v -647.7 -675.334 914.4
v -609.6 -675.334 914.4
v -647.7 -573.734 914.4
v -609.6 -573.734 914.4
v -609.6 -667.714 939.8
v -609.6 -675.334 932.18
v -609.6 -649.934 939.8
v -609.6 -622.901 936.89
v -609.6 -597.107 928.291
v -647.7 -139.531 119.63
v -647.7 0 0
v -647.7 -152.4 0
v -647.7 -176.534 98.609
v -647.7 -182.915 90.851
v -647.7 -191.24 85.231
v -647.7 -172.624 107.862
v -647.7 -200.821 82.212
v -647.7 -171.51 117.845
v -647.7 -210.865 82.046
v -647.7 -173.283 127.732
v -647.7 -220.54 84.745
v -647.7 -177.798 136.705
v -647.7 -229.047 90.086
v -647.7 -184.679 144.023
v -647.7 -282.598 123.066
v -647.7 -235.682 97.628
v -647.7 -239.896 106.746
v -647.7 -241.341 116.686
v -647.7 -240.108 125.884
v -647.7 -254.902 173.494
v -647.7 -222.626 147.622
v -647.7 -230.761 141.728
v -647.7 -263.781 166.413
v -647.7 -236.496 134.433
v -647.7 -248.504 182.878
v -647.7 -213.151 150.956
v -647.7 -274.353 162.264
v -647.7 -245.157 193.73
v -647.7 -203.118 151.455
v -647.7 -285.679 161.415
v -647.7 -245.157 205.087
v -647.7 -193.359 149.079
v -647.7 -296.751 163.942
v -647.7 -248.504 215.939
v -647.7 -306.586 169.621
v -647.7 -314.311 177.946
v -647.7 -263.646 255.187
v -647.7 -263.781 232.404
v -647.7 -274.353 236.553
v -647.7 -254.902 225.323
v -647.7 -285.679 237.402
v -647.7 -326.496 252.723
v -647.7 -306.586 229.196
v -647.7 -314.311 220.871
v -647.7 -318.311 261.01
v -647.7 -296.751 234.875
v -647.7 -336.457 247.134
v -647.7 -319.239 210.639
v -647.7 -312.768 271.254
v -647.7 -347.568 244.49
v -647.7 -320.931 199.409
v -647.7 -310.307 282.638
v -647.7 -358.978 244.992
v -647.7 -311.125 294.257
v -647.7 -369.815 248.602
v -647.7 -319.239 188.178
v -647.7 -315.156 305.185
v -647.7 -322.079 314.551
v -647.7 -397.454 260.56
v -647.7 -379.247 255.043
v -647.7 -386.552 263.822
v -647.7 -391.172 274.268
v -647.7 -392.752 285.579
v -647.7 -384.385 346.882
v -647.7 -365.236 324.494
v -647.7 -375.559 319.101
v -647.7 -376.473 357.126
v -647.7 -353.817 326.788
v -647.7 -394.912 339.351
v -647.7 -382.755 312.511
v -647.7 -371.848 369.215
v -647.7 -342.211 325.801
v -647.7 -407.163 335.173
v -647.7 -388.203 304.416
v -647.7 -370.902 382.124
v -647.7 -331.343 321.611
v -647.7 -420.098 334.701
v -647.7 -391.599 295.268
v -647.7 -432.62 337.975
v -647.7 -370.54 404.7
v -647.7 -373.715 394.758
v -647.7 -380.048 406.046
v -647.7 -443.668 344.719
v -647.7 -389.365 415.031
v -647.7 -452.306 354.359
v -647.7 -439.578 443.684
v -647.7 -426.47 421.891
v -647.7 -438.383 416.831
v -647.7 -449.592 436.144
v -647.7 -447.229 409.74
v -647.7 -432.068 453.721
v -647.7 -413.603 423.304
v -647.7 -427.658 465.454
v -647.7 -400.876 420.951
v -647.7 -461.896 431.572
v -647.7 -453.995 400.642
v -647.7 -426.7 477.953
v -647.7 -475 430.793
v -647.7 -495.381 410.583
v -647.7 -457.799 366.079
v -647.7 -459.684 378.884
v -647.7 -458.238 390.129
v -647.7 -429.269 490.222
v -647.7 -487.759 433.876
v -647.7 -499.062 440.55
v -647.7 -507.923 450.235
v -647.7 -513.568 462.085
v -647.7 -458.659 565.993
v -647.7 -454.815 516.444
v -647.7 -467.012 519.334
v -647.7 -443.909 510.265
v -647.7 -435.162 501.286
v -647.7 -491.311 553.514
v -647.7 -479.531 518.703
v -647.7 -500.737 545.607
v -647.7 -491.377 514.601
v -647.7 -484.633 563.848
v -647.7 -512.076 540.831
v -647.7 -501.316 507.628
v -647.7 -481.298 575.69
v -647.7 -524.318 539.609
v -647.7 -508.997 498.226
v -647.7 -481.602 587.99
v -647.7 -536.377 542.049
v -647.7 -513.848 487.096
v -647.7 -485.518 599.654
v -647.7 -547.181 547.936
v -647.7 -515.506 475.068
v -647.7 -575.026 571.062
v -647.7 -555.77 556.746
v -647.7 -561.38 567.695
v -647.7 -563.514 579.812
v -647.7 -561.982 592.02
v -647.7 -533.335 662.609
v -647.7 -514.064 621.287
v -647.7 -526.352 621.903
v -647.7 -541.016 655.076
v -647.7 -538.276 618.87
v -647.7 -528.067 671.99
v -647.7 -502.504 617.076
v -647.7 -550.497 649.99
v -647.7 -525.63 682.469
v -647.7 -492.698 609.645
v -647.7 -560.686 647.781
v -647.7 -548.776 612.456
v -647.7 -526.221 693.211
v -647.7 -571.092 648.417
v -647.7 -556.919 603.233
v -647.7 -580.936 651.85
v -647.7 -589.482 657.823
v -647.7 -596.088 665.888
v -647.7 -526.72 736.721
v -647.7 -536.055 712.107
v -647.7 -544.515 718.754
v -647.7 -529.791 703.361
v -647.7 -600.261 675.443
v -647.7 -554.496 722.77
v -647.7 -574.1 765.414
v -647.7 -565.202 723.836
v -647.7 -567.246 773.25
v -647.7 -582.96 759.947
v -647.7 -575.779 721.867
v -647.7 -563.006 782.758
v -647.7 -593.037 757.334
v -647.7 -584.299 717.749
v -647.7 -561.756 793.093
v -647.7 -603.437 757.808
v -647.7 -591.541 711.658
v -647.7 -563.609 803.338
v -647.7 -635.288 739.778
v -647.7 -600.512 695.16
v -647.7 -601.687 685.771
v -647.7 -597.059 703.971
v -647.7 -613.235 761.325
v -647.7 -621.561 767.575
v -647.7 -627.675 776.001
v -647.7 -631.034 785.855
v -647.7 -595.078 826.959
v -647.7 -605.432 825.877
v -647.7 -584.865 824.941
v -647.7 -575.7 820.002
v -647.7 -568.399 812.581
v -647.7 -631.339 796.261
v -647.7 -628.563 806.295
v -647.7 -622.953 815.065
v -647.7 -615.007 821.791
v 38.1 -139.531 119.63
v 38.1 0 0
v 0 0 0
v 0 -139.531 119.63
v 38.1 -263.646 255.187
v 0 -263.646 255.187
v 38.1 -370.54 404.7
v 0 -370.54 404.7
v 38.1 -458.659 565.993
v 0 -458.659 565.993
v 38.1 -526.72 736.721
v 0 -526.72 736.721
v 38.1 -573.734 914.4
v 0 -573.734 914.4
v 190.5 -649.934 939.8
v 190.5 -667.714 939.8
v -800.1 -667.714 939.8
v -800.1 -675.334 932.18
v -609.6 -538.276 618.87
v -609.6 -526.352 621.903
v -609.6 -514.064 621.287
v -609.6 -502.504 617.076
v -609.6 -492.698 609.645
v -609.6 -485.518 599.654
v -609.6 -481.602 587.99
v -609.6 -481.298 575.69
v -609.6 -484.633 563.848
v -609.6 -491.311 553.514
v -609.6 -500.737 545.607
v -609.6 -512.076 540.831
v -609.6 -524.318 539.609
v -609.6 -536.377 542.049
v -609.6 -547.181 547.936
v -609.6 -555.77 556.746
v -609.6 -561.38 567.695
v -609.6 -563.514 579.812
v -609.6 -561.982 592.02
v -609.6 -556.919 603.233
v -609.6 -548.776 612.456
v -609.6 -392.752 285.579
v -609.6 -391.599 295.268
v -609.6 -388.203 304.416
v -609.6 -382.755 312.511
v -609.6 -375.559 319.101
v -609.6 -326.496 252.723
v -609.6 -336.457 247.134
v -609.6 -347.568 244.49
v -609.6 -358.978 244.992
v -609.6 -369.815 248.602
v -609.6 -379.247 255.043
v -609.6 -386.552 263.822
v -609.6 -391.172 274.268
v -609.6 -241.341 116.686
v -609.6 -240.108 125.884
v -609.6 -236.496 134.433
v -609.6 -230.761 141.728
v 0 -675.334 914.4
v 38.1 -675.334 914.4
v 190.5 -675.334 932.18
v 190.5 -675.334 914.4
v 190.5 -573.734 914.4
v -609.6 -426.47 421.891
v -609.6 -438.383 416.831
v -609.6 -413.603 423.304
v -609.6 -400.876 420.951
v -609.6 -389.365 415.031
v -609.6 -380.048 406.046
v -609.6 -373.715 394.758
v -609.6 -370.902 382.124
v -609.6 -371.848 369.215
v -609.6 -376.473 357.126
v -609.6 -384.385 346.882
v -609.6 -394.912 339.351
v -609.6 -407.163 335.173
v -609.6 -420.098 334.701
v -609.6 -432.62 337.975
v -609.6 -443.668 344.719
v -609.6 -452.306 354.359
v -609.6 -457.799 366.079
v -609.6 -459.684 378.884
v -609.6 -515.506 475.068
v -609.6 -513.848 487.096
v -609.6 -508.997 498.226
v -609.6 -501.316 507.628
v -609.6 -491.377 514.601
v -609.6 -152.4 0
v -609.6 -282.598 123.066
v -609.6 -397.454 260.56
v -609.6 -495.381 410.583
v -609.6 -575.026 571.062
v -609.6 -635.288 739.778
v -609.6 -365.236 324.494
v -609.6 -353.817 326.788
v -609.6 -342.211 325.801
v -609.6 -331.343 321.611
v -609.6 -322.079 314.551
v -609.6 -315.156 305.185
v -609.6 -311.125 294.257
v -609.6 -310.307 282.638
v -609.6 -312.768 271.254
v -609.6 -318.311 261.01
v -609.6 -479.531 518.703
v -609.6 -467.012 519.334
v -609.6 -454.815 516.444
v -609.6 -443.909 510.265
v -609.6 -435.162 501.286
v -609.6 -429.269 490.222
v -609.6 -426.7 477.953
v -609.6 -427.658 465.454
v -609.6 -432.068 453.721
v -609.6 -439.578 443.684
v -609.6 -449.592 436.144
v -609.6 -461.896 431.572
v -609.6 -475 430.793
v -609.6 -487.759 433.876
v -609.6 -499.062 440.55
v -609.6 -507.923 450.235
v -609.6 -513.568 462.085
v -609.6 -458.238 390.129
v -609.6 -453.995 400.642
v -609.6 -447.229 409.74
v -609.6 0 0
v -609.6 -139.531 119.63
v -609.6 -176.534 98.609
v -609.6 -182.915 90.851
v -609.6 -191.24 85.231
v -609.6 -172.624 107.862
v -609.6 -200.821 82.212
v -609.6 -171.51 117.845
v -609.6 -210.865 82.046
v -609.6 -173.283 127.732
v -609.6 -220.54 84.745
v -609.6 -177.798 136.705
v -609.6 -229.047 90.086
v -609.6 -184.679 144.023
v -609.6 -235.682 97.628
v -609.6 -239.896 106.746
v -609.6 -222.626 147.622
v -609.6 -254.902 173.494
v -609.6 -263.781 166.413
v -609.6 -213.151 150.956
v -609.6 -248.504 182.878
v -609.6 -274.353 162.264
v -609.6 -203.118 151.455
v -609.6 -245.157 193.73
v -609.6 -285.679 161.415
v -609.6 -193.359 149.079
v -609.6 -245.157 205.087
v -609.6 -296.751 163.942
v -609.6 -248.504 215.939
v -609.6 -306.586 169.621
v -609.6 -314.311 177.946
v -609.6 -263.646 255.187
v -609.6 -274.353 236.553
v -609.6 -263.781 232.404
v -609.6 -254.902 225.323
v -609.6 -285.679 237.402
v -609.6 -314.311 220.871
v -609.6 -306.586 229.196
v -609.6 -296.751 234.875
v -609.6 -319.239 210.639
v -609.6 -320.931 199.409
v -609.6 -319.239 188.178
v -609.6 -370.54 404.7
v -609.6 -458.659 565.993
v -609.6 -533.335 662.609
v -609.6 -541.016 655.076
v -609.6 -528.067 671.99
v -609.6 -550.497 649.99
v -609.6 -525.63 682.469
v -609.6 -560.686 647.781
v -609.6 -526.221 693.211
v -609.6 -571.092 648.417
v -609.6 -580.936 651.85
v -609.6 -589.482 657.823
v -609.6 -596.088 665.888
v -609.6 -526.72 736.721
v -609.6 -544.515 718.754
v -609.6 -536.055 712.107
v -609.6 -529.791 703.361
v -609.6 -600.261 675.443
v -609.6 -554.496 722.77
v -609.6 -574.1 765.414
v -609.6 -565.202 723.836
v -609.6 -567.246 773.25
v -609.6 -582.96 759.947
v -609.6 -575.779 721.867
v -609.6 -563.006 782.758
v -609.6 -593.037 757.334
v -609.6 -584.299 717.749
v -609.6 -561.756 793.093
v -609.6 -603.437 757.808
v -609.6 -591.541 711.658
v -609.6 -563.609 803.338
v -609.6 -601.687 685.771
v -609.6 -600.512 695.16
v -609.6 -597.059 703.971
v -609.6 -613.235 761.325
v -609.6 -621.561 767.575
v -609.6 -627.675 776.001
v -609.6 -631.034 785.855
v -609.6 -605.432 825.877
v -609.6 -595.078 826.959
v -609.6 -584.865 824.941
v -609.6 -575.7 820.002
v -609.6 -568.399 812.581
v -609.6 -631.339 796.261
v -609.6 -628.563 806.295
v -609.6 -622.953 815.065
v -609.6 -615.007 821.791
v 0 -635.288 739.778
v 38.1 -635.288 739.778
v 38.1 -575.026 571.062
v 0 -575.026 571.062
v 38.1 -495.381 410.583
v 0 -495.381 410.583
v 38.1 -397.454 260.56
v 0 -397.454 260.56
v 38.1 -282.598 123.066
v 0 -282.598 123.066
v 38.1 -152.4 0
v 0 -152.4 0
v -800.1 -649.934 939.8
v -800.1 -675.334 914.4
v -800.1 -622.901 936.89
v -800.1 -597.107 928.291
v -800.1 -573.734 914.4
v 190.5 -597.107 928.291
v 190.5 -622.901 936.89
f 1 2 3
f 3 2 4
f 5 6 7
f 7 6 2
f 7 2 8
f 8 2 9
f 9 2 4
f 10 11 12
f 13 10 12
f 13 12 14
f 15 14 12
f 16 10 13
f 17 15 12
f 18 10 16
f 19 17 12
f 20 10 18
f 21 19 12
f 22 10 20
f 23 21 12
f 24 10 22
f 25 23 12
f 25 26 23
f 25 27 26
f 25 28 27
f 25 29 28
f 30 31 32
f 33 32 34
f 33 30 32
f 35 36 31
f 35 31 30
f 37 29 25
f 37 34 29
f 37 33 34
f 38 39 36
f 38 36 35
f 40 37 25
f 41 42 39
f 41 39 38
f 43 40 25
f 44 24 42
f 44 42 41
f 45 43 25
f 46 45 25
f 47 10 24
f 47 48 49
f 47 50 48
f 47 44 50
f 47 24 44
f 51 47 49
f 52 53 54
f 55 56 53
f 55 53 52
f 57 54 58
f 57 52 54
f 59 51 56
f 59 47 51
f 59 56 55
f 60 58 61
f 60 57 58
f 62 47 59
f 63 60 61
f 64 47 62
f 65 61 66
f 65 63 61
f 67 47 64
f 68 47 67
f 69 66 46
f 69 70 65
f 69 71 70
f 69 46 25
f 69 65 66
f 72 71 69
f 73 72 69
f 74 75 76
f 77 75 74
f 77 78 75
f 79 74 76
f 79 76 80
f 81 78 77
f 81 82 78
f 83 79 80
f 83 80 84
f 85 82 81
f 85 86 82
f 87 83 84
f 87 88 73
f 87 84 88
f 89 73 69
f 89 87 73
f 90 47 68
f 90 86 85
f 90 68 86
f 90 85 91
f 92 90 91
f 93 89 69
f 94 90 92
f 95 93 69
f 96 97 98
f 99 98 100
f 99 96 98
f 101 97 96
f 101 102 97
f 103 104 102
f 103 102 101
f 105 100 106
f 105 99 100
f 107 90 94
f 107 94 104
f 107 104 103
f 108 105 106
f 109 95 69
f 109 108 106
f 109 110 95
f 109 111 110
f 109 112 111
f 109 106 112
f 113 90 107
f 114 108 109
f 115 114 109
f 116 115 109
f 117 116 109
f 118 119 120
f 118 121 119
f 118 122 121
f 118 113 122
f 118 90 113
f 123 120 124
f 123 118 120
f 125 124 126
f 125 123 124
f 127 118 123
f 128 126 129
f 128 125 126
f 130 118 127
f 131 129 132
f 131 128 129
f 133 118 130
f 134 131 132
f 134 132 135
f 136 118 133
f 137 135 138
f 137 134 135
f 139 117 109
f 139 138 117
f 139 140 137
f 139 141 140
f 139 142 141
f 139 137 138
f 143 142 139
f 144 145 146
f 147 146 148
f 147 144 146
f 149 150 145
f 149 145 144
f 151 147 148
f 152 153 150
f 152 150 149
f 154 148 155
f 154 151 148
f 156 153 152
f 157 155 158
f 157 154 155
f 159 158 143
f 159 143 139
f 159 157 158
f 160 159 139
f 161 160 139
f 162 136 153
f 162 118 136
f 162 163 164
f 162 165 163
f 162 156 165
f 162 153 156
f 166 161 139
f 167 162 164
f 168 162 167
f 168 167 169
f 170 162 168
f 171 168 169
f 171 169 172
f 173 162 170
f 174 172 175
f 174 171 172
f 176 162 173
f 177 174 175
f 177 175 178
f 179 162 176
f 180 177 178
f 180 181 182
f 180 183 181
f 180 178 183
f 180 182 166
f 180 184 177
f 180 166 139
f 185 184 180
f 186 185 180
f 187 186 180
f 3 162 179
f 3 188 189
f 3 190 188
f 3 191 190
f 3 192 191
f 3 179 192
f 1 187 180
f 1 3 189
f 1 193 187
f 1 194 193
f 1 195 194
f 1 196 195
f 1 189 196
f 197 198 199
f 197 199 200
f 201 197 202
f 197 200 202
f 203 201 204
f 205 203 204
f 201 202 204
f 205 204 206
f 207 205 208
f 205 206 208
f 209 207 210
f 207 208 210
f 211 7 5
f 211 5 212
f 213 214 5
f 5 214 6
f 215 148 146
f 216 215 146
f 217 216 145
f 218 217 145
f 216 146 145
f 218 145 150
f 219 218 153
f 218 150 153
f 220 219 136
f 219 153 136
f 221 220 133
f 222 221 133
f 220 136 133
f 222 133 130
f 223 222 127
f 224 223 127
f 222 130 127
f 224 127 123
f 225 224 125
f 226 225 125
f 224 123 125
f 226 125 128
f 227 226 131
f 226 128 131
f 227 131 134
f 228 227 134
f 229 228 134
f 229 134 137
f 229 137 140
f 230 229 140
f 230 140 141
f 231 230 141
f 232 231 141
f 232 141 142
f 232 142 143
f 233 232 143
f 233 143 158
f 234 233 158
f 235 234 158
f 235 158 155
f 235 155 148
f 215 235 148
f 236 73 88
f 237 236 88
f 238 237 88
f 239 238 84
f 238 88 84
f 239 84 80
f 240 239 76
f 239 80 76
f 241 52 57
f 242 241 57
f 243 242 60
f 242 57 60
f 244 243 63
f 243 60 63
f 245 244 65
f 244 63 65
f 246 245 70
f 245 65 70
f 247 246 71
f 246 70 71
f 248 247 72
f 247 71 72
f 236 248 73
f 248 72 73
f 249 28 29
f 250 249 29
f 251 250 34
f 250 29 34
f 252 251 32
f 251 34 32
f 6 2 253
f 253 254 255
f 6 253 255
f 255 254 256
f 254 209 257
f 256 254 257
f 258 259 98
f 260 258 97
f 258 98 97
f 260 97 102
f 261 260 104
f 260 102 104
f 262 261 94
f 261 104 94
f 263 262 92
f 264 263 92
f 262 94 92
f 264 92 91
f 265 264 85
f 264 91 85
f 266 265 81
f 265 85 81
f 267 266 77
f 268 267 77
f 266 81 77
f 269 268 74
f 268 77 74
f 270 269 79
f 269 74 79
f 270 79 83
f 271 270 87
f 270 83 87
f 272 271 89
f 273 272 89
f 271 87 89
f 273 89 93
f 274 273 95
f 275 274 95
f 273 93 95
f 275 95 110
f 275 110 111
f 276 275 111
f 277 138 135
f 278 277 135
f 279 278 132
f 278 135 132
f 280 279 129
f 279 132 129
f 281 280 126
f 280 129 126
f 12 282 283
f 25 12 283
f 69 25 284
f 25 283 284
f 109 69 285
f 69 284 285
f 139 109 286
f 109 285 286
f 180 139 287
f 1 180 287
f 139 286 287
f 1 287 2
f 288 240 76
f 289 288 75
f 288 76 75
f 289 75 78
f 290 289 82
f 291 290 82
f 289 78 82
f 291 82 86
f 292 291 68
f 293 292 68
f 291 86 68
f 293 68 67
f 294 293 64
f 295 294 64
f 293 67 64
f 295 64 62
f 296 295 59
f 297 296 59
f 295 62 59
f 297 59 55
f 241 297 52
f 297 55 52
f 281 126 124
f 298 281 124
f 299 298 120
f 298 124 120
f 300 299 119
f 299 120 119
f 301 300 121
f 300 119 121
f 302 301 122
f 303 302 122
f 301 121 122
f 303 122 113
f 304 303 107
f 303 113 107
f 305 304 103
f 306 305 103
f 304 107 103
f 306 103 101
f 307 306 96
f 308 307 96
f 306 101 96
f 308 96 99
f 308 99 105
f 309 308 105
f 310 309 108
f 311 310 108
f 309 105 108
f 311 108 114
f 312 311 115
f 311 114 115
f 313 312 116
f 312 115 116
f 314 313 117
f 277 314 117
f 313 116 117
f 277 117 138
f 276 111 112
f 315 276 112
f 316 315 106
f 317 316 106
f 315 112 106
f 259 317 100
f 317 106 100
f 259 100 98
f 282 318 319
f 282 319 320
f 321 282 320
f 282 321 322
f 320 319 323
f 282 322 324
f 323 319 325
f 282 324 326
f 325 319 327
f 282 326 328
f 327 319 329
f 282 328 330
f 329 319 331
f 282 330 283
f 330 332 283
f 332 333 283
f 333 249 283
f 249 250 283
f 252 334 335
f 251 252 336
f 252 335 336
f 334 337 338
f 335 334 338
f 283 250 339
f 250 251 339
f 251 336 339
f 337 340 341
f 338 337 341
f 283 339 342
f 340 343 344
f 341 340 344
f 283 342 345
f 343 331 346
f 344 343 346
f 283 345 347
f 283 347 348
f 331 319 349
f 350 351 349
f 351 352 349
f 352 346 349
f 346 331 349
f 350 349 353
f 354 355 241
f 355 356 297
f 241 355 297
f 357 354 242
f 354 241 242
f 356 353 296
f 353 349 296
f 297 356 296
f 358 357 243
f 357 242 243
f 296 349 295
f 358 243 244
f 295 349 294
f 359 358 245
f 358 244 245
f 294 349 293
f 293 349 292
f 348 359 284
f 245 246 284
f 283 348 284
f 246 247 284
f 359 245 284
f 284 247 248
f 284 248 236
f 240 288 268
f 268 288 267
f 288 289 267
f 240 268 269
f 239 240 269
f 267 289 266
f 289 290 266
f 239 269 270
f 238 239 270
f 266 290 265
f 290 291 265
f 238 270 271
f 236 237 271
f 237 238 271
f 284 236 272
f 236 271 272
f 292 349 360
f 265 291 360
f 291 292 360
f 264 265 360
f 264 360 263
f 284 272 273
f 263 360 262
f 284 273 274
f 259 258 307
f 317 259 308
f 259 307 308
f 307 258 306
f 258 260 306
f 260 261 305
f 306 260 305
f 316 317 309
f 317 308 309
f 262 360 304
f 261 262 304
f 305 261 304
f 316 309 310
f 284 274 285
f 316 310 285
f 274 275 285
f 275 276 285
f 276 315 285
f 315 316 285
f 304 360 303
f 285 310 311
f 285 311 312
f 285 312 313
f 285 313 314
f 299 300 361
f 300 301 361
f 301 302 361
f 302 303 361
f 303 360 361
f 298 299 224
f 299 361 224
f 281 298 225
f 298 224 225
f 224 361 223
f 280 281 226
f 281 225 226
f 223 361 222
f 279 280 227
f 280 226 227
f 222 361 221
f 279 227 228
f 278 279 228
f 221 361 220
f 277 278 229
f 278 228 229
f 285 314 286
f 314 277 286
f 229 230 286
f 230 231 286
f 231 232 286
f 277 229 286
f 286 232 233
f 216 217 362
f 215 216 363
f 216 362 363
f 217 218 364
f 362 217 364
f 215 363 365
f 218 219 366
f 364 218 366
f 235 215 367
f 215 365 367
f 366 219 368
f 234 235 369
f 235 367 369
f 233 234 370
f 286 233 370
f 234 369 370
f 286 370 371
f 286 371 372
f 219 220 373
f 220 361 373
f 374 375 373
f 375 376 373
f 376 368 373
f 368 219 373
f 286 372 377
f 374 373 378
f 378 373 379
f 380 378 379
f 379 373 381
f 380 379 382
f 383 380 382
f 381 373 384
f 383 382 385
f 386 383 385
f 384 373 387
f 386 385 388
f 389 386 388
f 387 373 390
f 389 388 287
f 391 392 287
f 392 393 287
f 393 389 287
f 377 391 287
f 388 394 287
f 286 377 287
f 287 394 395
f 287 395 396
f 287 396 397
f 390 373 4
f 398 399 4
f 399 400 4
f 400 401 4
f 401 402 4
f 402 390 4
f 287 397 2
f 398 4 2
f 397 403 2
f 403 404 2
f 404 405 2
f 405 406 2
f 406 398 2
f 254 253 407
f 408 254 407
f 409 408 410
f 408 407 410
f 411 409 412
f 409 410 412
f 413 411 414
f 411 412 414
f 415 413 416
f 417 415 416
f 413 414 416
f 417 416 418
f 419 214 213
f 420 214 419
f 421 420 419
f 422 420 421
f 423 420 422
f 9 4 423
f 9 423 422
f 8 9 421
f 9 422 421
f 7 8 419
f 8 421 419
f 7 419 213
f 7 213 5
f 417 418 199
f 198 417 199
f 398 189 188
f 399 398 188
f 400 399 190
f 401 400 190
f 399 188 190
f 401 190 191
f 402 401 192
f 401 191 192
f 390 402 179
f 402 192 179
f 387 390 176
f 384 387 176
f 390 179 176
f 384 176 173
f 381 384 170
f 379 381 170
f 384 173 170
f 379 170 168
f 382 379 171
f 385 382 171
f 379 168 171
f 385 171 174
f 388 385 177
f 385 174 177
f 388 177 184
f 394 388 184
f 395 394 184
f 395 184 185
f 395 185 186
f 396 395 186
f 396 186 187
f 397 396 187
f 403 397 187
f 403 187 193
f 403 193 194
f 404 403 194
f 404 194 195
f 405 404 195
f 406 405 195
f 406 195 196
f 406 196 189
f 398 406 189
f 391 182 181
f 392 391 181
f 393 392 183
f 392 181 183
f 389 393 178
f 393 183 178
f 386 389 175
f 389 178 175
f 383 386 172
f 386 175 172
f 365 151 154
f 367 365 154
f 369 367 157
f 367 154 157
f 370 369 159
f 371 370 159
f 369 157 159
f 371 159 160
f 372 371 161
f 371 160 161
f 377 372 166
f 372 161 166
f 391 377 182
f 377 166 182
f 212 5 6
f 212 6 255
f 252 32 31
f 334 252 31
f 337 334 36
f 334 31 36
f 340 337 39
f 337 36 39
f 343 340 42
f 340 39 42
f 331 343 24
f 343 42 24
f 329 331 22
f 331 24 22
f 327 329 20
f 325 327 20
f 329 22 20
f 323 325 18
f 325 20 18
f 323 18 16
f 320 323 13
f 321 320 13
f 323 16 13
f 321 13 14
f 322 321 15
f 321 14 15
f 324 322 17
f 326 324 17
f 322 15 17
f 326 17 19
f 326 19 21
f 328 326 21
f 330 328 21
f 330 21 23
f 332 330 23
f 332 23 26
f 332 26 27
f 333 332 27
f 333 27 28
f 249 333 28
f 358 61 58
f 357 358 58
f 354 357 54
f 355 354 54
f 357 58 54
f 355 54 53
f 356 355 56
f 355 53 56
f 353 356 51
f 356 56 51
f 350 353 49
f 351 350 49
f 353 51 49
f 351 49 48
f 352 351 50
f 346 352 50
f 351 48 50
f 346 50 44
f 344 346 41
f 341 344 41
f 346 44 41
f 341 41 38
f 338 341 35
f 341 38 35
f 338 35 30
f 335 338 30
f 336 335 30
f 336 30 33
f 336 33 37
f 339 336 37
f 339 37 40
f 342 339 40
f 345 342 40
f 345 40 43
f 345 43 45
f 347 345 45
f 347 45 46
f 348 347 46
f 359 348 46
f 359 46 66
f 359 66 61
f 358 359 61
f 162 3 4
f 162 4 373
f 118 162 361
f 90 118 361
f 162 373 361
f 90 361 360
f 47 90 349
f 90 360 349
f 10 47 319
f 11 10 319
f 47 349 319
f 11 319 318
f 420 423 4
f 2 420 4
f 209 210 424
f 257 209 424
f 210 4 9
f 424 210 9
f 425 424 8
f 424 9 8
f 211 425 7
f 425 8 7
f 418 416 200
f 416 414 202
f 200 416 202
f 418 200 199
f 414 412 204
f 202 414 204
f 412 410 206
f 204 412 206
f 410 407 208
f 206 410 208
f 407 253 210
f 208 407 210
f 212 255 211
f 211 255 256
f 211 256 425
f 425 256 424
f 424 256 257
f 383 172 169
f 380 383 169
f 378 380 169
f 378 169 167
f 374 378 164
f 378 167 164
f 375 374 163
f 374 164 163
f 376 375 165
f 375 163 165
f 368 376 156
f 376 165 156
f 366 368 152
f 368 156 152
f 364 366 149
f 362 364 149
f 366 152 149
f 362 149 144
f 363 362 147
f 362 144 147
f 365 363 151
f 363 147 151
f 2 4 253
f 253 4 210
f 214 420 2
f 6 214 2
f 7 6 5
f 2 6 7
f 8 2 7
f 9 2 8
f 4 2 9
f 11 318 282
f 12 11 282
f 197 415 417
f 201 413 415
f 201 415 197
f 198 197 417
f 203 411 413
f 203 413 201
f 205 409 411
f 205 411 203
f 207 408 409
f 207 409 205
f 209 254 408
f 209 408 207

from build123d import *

# Parameters (mm, degrees)
F1_DEPTH      = 38.1
F2_W          = 609.6
F2_H          = 101.6
F2_W_2        = 152.4
F2_W_3        = 38.1
F3_DEPTH      = 25.4
F5_DEPTH      = 38.1
F6_W          = 152.4
F6_H          = 101.6
F6_W_2        = 38.1
F7_DEPTH      = 25.4
F8_T1_DEPTH   = 342.8999998581
F8_T3_DEPTH   = 38.0999997161
F8_T5_DEPTH   = 800.1000004258
F8_2_T1_DEPTH = 571.5
F9_SIZE       = 7.62
F9_2_SIZE     = 7.62
F11_DEPTH     = 762


# Not quite as in the source:
# - a fillet or chamfer that OpenCascade refuses, or shapes differently, is made with other operations: its cross-section is extruded or revolved along the edge and cut away or added


with BuildPart() as f1:
    # F0 (on Right) → F1 (new body)
    with BuildSketch(Plane.YZ):
        with BuildLine():
            Line((-152.4, 0), (0, 0))
            ThreePointArc((0, 0), (-370.5404323347, 404.6996785445), (-573.7339955129, 914.4))
            Line((-573.7339955129, 914.4), (-675.3339955129, 914.4))
            ThreePointArc((-675.3339955129, 914.4), (-495.3809833516, 410.5831647228), (-152.4, 0))
        make_face()
    extrude(amount=F1_DEPTH)

    # F2 (on face) → F3 (join)
    with BuildSketch(Plane.XY.offset(914.4)):
        with Locations((-304.8, -624.5339955129)):
            Rectangle(F2_W, F2_H)
        with Locations((114.3, -624.5339955129)):
            Rectangle(F2_W_2, F2_H)
        with Locations((19.05, -624.5339955129)):
            Rectangle(F2_W_3, F2_H)
    extrude(amount=F3_DEPTH)

    # F8: fillet of radius 127 on 1 edges, made by hand

    # F8_s2 → F8_t1 (cut)
    with BuildSketch(Plane.YZ.offset(38.1000001419)):
        with BuildLine():
            ThreePointArc((-573.7339955129, 914.4), (-609.7730692288, 933.2827788524), (-649.9339955129, 939.8))
            Line((-649.9339955129, 939.8), (-573.7339955129, 939.8))
            Line((-573.7339955129, 939.8), (-573.7339955129, 914.4))
        make_face()
    extrude(amount=F8_T1_DEPTH, mode=Mode.SUBTRACT)

    # F8_s4 → F8_t3 (cut)
    with BuildSketch(Plane.YZ.offset(4.258e-07)):
        with BuildLine():
            ThreePointArc((-573.7339955129, 914.4), (-609.7730692288, 933.2827788524), (-649.9339955129, 939.8))
            Line((-649.9339955129, 939.8), (-573.7339955129, 939.8))
            Line((-573.7339955129, 939.8), (-573.7339955129, 914.4))
        make_face()
    extrude(amount=F8_T3_DEPTH, mode=Mode.SUBTRACT)

    # F8_s6 → F8_t5 (cut)
    with BuildSketch(Plane.YZ.offset(-800.1)):
        with BuildLine():
            ThreePointArc((-573.7339955129, 914.4), (-609.7730692288, 933.2827788524), (-649.9339955129, 939.8))
            Line((-649.9339955129, 939.8), (-573.7339955129, 939.8))
            Line((-573.7339955129, 939.8), (-573.7339955129, 914.4))
        make_face()
    extrude(amount=F8_T5_DEPTH, mode=Mode.SUBTRACT)

    # F9
    f9_edges = [f1.edges().sort_by_distance(p)[0] for p in [
        (-209.55, -675.333996, 939.8),
    ]]
    chamfer(f9_edges, length=F9_SIZE)


with BuildPart() as f5:
    # F4 (on face) → F5 (new body)
    with BuildSketch(Plane(origin=(-609.6, 0, 0), x_dir=(0, -1, 0), z_dir=(-1, 0, 0))):
        with BuildLine():
            Line((675.3339955129, 914.4), (573.7339955129, 914.4))
            ThreePointArc((573.7339955129, 914.4), (370.5404323347, 404.6996785445), (0, 0))
            Line((0, 0), (152.4, 0))
            ThreePointArc((152.4, 0), (495.3809833516, 410.5831647228), (675.3339955129, 914.4))
        make_face()
    extrude(amount=F5_DEPTH)

    # F10 (on face) → F11 (cut)
    with BuildSketch(Plane(origin=(-647.7, 0, 0), x_dir=(0, -1, 0), z_dir=(-1, 0, 0))):
        with BuildLine():
            ThreePointArc((631.5913753294, 792.0699234096), (624.2879152452, 813.4429474745), (605.4321107523, 825.876986392))
            ThreePointArc((605.4321107523, 825.876986392), (596.6663753294, 792.0699234096), (587.1282473408, 758.472605965))
            ThreePointArc((587.1282473408, 758.472605965), (617.7214994682, 764.2052975822), (631.5913753294, 792.0699234096))
        make_face()
        with BuildLine():
            ThreePointArc((587.1282473408, 758.472605965), (596.6663753294, 792.0699234096), (605.4321107523, 825.876986392))
            ThreePointArc((605.4321107523, 825.876986392), (562.9619724604, 801.2224559686), (587.1282473408, 758.472605965))
        make_face()
        with BuildLine():
            ThreePointArc((550.4966543465, 649.9899449451), (563.5869997391, 685.7705662017), (575.778808754, 721.8672390808))
            ThreePointArc((575.778808754, 721.8672390808), (527.6455446354, 698.4126311054), (550.4966543465, 649.9899449451))
        make_face()
        with BuildLine():
            ThreePointArc((601.6869997391, 685.7705662017), (594.5395272891, 707.986574805), (575.778808754, 721.8672390808))
            ThreePointArc((575.778808754, 721.8672390808), (563.5869997391, 685.7705662017), (550.4966543465, 649.9899449451))
            ThreePointArc((550.4966543465, 649.9899449451), (585.4143660546, 654.5427568048), (601.6869997391, 685.7705662017))
        make_face()
        with BuildLine():
            ThreePointArc((563.5267279961, 580.8319471591), (556.6393542578, 603.6599296605), (538.2757632433, 618.869506484))
            ThreePointArc((538.2757632433, 618.869506484), (522.2517279961, 580.8319471591), (505.2034801813, 543.2422827359))
            ThreePointArc((505.2034801813, 543.2422827359), (544.6119515689, 546.1383450576), (563.5267279961, 580.8319471591))
        make_face()
        with BuildLine():
            ThreePointArc((505.2034801813, 543.2422827359), (522.2517279961, 580.8319471591), (538.2757632433, 618.869506484))
            ThreePointArc((538.2757632433, 618.869506484), (484.4346485768, 597.3696050705), (505.2034801813, 543.2422827359))
        make_face()
        with BuildLine():
            ThreePointArc((491.3765799038, 514.6013703621), (471.0563792428, 475.0679421639), (449.5918860193, 436.1439388927))
            ThreePointArc((449.5918860193, 436.1439388927), (493.658434196, 436.793281984), (515.5063792428, 475.0679421639))
            ThreePointArc((515.5063792428, 475.0679421639), (508.9973558998, 498.2257656867), (491.3765799038, 514.6013703621))
        make_face()
        with BuildLine():
            ThreePointArc((491.3765799038, 514.6013703621), (431.8234913863, 495.962511086), (449.5918860193, 436.1439388927))
            ThreePointArc((449.5918860193, 436.1439388927), (471.0563792428, 475.0679421639), (491.3765799038, 514.6013703621))
        make_face()
        with BuildLine():
            ThreePointArc((438.3828882756, 416.8305093134), (377.6291498002, 402.5840820999), (390.9880699941, 341.6290439297))
            ThreePointArc((390.9880699941, 341.6290439297), (415.2338814717, 378.8841526504), (438.3828882756, 416.8305093134))
        make_face()
        with BuildLine():
            ThreePointArc((438.3828882756, 416.8305093134), (415.2338814717, 378.8841526504), (390.9880699941, 341.6290439297))
            ThreePointArc((390.9880699941, 341.6290439297), (436.4244003401, 339.8103198452), (459.6838814717, 378.8841526504))
            ThreePointArc((459.6838814717, 378.8841526504), (453.9945306693, 400.6422447953), (438.3828882756, 416.8305093134))
        make_face()
        with BuildLine():
            ThreePointArc((375.559494086, 319.1005287315), (351.4771368764, 285.5794055964), (326.4958314478, 252.7227471528))
            ThreePointArc((326.4958314478, 252.7227471528), (369.8145609517, 248.6015135083), (392.7521368764, 285.5794055964))
            ThreePointArc((392.7521368764, 285.5794055964), (388.2033190822, 304.4158905549), (375.559494086, 319.1005287315))
        make_face()
        with BuildLine():
            ThreePointArc((307.2689413413, 228.6388188544), (253.9087320552, 224.2096185946), (257.6705836541, 170.7982132344))
            ThreePointArc((257.6705836541, 170.7982132344), (282.8312945287, 199.4085020881), (307.2689413413, 228.6388188544))
        make_face()
        with BuildLine():
            ThreePointArc((307.2689413413, 228.6388188544), (282.8312945287, 199.4085020881), (257.6705836541, 170.7982132344))
            ThreePointArc((257.6705836541, 170.7982132344), (298.5314046506, 164.6937135656), (320.9312945287, 199.4085020881))
            ThreePointArc((320.9312945287, 199.4085020881), (317.3471194758, 215.5413204475), (307.2689413413, 228.6388188544))
        make_face()
        with BuildLine():
            ThreePointArc((375.559494086, 319.1005287315), (318.2852026333, 310.1134865085), (326.4958314478, 252.7227471528))
            ThreePointArc((326.4958314478, 252.7227471528), (351.4771368764, 285.5794055964), (375.559494086, 319.1005287315))
        make_face()
        with BuildLine():
            ThreePointArc((230.7606464602, 141.7281596434), (181.6547503588, 141.316474077), (181.5037371724, 92.2090844911))
            ThreePointArc((181.5037371724, 92.2090844911), (206.4159134771, 116.686402497), (230.7606464602, 141.7281596434))
        make_face()
        with BuildLine():
            ThreePointArc((230.7606464602, 141.7281596434), (206.4159134771, 116.686402497), (181.5037371724, 92.2090844911))
            ThreePointArc((181.5037371724, 92.2090844911), (219.6389590332, 84.3613860049), (241.3409134771, 116.686402497))
            ThreePointArc((241.3409134771, 116.686402497), (238.5872938052, 130.2789707894), (230.7606464602, 141.7281596434))
        make_face()
    extrude(amount=-F11_DEPTH, mode=Mode.SUBTRACT)


with BuildPart() as f7:
    # F6 (on face) → F7 (new body)
    with BuildSketch(Plane.XY.offset(914.4)):
        with Locations((-723.9, -624.5339955129)):
            Rectangle(F6_W, F6_H)
        with Locations((-628.65, -624.5339955129)):
            Rectangle(F6_W_2, F6_H)
    extrude(amount=F7_DEPTH)

    # F8#2: fillet of radius 127 on 1 edges, made by hand

    # F8_2_s2 → F8_2_t1 (cut)
    with BuildSketch(Plane.YZ.offset(-990.6)):
        with BuildLine():
            ThreePointArc((-573.7339955129, 914.4), (-609.7730692288, 933.2827788524), (-649.9339955129, 939.8))
            Line((-649.9339955129, 939.8), (-573.7339955129, 939.8))
            Line((-573.7339955129, 939.8), (-573.7339955129, 914.4))
        make_face()
    extrude(amount=F8_2_T1_DEPTH, mode=Mode.SUBTRACT)

    # F9#2
    f9_2_edges = [f7.edges().sort_by_distance(p)[0] for p in [
        (-704.85, -675.333996, 939.8),
    ]]
    chamfer(f9_2_edges, length=F9_2_SIZE)


solid = Compound([f1.part, f5.part, f7.part])
